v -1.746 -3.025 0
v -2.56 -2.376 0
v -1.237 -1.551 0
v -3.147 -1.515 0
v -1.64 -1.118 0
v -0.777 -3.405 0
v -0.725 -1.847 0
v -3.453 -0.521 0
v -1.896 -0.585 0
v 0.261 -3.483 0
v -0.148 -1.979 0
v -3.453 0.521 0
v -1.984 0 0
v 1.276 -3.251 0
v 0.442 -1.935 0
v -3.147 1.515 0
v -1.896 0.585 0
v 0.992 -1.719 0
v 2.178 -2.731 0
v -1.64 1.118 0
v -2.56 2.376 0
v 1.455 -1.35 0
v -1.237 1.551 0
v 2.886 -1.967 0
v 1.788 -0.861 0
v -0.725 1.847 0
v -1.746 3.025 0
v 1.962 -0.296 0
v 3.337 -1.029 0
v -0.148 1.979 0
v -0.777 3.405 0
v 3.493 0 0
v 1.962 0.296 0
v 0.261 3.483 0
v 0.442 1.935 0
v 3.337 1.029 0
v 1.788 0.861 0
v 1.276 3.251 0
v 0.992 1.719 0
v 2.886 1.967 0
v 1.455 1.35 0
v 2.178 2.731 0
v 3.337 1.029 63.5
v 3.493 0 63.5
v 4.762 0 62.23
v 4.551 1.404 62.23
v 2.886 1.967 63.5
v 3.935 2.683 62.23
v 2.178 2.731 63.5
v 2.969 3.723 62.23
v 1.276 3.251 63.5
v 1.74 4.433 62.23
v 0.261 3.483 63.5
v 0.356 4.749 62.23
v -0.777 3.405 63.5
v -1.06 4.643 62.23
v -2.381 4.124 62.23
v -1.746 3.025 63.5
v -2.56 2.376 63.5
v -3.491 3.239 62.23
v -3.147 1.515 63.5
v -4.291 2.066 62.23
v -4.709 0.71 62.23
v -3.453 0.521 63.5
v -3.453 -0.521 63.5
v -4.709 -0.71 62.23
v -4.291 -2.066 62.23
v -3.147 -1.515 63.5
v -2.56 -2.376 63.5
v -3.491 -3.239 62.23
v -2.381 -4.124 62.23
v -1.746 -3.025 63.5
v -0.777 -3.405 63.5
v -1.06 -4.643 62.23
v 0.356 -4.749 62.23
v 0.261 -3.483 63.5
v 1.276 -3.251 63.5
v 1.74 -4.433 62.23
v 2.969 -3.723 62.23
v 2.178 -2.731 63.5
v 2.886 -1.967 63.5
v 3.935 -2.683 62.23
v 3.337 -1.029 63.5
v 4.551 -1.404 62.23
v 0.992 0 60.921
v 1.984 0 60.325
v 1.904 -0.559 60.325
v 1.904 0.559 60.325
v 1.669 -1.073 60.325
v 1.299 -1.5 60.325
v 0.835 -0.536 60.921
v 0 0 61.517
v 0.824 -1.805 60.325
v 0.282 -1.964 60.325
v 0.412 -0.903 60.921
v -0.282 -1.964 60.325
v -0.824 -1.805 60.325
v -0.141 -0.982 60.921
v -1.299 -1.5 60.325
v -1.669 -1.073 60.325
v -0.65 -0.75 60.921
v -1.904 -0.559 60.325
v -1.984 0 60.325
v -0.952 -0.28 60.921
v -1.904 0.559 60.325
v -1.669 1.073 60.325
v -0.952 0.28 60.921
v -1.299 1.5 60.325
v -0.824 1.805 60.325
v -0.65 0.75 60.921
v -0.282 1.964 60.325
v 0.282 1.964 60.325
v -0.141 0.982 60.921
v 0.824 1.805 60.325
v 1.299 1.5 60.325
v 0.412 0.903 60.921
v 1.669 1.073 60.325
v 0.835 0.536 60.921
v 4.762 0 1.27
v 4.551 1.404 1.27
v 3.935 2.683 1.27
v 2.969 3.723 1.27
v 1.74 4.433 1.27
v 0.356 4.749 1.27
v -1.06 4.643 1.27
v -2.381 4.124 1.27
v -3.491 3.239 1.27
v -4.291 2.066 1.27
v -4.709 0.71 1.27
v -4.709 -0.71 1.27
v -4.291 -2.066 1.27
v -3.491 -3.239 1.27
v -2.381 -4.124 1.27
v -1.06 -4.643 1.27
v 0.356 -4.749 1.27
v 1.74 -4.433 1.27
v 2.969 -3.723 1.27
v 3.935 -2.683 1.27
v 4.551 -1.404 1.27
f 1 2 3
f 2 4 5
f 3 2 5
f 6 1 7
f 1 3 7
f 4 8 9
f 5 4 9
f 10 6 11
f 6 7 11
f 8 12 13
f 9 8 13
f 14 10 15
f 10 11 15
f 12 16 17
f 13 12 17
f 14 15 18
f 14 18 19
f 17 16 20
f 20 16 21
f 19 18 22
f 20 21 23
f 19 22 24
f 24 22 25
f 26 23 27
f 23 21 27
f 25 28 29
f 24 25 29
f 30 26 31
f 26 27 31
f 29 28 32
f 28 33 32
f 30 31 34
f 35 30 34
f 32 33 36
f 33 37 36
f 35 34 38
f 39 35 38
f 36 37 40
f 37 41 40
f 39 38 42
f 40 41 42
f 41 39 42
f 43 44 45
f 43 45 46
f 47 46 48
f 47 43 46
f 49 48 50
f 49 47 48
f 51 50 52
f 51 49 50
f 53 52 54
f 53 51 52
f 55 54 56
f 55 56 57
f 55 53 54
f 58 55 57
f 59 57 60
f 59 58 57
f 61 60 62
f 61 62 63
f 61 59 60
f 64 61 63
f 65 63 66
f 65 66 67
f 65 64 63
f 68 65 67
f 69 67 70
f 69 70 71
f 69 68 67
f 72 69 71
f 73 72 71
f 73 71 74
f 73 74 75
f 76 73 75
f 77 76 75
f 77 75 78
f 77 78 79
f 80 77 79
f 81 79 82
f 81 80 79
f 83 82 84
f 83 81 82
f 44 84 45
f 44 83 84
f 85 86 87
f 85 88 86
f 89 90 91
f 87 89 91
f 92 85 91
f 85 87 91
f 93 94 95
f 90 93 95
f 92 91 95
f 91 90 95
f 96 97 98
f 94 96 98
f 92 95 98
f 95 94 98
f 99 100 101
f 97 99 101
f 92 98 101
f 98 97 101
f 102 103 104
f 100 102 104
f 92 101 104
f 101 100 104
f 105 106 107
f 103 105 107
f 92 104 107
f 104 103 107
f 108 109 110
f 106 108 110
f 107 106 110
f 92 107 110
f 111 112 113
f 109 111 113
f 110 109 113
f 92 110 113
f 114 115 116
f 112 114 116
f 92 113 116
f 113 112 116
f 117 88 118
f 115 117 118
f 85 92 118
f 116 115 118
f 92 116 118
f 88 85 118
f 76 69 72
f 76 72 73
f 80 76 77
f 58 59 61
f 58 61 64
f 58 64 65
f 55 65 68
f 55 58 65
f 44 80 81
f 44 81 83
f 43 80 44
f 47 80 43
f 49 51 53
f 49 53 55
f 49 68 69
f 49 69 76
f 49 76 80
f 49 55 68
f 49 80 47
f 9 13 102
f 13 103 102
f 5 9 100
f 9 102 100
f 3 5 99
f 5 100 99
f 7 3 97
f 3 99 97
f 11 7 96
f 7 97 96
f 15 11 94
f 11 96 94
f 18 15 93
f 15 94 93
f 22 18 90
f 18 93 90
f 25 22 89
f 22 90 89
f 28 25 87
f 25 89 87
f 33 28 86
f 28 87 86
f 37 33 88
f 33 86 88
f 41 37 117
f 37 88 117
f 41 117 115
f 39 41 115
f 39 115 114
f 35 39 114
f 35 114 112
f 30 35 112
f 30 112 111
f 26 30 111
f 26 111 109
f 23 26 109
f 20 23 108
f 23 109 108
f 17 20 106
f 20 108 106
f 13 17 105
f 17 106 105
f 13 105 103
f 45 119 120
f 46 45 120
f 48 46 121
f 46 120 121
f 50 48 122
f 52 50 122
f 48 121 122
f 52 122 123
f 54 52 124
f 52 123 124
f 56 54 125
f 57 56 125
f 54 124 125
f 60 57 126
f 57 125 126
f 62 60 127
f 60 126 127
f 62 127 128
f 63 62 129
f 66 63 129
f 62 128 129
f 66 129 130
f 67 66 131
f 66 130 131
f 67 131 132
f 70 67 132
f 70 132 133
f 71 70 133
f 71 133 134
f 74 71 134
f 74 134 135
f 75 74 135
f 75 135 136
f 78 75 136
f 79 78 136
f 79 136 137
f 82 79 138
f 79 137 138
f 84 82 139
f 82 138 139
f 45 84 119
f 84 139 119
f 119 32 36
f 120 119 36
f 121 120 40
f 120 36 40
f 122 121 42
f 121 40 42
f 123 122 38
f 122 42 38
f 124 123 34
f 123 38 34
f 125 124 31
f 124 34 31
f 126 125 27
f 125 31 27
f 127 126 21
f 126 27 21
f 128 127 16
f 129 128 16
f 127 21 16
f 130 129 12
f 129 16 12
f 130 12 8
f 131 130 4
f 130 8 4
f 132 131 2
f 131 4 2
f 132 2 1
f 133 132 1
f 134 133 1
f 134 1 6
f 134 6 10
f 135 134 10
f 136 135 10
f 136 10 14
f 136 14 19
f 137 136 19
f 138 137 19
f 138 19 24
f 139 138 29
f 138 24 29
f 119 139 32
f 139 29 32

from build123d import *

# Parameters (mm, degrees)
F0_R     = 4.7625
F1_DEPTH = 63.5
F2_SIZE  = 1.27
F4_D     = 3.96875
F4_DEPTH = 60.325
F4_TIP   = 1.1923327909


with BuildPart() as f1:
    # F0 (on Top) → F1 (new body)
    with BuildSketch(Plane.XY):
        Circle(F0_R)
    extrude(amount=F1_DEPTH)

    # F2
    f2_edges = [f1.edges().sort_by_distance(p)[0] for p in [
        (-4.7625, 0, 63.5),
        (-4.7625, 0, 0),
    ]]
    chamfer(f2_edges, length=F2_SIZE)

    # F4
    with Locations(Plane(origin=(0, 0, 0), x_dir=(1, 0, 0), z_dir=(0, 0, -1))):
        with Locations((0, 0)):
            Hole(F4_D / 2, depth=F4_DEPTH)
            with Locations((0, 0, -(F4_DEPTH + F4_TIP / 2))):  # 118° drill point
                Cone(0, F4_D / 2, F4_TIP, mode=Mode.SUBTRACT)


solid = f1.part
